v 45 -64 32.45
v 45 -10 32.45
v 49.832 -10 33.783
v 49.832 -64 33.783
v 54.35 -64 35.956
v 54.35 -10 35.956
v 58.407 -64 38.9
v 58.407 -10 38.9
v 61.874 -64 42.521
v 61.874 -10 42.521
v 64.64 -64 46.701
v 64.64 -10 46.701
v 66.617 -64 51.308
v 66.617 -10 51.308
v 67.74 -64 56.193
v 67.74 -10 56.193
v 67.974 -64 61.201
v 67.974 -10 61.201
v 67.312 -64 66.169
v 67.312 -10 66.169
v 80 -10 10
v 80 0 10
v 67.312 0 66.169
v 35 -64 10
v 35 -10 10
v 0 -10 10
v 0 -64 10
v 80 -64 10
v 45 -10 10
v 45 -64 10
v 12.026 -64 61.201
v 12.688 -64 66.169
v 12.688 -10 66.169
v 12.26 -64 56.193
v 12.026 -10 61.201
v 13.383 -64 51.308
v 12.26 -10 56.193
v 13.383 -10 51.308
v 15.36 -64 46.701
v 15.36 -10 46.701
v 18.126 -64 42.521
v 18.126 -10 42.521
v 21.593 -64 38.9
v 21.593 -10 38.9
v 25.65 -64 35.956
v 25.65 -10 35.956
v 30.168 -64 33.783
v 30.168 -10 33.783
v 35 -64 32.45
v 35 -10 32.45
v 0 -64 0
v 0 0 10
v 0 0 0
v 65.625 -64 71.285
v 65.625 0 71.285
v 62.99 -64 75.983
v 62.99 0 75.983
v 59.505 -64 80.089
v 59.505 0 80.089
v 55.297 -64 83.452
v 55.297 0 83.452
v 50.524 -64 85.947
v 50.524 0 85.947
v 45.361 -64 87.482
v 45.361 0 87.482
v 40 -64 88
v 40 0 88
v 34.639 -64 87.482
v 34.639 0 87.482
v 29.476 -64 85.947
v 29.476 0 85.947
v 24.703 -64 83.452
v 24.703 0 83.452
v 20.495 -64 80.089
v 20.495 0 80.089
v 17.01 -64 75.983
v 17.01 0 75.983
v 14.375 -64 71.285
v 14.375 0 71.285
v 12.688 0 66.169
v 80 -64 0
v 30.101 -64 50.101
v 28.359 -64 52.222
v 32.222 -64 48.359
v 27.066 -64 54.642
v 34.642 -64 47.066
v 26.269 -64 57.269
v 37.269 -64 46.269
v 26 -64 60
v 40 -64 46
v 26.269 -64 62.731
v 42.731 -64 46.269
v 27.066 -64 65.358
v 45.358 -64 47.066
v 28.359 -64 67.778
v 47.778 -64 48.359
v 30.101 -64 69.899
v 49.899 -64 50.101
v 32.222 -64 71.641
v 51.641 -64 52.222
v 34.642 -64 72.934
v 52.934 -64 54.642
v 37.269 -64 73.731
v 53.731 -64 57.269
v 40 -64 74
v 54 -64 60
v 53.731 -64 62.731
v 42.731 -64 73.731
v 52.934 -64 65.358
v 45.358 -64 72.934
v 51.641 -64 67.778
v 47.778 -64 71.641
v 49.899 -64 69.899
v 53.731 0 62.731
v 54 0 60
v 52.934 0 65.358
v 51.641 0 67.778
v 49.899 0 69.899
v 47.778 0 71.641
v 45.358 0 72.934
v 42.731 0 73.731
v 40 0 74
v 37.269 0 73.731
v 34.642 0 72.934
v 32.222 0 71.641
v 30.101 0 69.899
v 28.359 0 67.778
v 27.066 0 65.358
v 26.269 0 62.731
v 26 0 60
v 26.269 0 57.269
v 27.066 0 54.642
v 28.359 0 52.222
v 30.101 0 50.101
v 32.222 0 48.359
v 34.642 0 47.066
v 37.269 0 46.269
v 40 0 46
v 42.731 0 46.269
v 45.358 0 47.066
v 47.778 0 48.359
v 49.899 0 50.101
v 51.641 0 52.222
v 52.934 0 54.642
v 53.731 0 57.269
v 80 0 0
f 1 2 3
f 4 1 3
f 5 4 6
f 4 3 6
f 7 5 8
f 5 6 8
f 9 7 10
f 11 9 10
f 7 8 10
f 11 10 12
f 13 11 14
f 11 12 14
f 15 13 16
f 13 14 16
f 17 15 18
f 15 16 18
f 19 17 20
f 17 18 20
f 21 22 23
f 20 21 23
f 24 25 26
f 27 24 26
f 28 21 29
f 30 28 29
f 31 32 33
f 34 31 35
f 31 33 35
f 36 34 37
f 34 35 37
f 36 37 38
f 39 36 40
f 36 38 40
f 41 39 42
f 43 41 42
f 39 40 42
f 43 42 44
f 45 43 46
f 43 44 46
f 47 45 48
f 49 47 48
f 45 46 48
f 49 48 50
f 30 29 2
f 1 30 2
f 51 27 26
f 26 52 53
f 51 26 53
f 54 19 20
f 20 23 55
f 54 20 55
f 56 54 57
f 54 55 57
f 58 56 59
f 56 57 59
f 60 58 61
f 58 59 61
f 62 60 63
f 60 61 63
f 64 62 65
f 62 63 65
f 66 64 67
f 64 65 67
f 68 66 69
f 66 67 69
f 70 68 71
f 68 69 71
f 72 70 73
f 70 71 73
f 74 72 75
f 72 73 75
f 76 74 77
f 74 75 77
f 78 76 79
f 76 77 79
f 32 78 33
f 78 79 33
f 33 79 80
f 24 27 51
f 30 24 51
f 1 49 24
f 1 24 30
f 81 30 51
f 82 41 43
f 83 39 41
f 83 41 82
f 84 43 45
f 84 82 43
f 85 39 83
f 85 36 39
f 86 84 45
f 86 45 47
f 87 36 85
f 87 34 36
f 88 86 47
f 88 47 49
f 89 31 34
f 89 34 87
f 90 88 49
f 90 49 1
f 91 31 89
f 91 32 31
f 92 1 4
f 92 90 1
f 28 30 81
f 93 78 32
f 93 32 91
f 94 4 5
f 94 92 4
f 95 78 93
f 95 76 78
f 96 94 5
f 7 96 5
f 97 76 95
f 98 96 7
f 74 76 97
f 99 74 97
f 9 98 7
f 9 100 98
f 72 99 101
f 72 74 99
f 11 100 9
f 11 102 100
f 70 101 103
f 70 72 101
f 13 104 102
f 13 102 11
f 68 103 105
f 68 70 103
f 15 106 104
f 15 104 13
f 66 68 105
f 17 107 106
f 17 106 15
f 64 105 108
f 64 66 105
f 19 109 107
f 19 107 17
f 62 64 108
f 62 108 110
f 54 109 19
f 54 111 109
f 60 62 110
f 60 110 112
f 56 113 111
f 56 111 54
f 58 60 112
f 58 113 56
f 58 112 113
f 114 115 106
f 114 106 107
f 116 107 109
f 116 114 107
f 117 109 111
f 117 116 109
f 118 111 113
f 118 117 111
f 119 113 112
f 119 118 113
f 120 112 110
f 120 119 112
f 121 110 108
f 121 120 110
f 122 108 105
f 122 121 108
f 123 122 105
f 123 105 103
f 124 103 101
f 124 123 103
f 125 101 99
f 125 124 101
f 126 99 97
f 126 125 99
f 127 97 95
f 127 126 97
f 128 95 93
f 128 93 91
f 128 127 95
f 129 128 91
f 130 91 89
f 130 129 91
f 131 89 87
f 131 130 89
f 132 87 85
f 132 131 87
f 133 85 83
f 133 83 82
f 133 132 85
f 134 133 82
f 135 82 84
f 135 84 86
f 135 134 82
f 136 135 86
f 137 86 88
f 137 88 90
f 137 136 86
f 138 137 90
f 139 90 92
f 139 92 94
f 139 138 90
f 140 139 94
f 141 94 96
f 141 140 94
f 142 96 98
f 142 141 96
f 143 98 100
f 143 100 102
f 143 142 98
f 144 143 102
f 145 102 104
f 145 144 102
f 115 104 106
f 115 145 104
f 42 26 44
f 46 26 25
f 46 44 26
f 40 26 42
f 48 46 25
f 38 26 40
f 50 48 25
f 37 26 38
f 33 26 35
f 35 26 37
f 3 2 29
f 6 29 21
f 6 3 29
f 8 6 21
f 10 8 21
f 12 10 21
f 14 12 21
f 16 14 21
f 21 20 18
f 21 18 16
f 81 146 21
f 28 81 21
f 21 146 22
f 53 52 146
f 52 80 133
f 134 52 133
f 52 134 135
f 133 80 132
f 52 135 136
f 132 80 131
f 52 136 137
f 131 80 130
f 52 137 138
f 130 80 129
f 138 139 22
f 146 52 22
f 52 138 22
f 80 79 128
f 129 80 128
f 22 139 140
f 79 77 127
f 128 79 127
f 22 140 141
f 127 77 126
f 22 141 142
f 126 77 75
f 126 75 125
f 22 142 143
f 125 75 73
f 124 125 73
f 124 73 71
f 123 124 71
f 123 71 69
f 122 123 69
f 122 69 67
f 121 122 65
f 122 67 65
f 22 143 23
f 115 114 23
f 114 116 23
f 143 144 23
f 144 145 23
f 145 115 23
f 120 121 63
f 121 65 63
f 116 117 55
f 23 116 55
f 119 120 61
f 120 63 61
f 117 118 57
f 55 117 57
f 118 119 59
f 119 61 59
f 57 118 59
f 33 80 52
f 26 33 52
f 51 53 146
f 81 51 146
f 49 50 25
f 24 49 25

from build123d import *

# Parameters (mm, degrees)
F0_R     = 14
F1_DEPTH = 64
F2_DEPTH = 10


with BuildPart() as f1:
    # F0 (on Front) → F1 (new body)
    with BuildSketch(Plane.XZ):
        with BuildLine():
            Line((0, 10), (0, 0))
            Line((0, 0), (80, 0))
            Line((80, 0), (80, 10))
            Line((80, 10), (45, 10))
            Line((45, 10), (45, 32.450045))
            ThreePointArc((45, 32.450045), (63.350892, 44.548921), (67.311856, 66.169485))
            ThreePointArc((67.311856, 66.169485), (40, 88), (12.688144, 66.169485))
            ThreePointArc((12.688144, 66.169485), (16.649108, 44.548921), (35, 32.450045))
            Line((35, 32.450045), (35, 10))
            Line((35, 10), (0, 10))
        make_face()
        with Locations((40, 60)):
            Circle(F0_R, mode=Mode.SUBTRACT)
    extrude(amount=F1_DEPTH)

    # F0 (on Front) → F2 (join)
    with BuildSketch(Plane.XZ):
        with BuildLine():
            Line((45, 10), (80, 10))
            Line((80, 10), (67.311856, 66.169485))
            ThreePointArc((67.311856, 66.169485), (63.350892, 44.548921), (45, 32.450045))
            Line((45, 32.450045), (45, 10))
        make_face()
        with BuildLine():
            Line((12.688144, 66.169485), (0, 10))
            Line((0, 10), (35, 10))
            Line((35, 10), (35, 32.450045))
            ThreePointArc((35, 32.450045), (16.649108, 44.548921), (12.688144, 66.169485))
        make_face()
    extrude(amount=F2_DEPTH)


solid = f1.part
